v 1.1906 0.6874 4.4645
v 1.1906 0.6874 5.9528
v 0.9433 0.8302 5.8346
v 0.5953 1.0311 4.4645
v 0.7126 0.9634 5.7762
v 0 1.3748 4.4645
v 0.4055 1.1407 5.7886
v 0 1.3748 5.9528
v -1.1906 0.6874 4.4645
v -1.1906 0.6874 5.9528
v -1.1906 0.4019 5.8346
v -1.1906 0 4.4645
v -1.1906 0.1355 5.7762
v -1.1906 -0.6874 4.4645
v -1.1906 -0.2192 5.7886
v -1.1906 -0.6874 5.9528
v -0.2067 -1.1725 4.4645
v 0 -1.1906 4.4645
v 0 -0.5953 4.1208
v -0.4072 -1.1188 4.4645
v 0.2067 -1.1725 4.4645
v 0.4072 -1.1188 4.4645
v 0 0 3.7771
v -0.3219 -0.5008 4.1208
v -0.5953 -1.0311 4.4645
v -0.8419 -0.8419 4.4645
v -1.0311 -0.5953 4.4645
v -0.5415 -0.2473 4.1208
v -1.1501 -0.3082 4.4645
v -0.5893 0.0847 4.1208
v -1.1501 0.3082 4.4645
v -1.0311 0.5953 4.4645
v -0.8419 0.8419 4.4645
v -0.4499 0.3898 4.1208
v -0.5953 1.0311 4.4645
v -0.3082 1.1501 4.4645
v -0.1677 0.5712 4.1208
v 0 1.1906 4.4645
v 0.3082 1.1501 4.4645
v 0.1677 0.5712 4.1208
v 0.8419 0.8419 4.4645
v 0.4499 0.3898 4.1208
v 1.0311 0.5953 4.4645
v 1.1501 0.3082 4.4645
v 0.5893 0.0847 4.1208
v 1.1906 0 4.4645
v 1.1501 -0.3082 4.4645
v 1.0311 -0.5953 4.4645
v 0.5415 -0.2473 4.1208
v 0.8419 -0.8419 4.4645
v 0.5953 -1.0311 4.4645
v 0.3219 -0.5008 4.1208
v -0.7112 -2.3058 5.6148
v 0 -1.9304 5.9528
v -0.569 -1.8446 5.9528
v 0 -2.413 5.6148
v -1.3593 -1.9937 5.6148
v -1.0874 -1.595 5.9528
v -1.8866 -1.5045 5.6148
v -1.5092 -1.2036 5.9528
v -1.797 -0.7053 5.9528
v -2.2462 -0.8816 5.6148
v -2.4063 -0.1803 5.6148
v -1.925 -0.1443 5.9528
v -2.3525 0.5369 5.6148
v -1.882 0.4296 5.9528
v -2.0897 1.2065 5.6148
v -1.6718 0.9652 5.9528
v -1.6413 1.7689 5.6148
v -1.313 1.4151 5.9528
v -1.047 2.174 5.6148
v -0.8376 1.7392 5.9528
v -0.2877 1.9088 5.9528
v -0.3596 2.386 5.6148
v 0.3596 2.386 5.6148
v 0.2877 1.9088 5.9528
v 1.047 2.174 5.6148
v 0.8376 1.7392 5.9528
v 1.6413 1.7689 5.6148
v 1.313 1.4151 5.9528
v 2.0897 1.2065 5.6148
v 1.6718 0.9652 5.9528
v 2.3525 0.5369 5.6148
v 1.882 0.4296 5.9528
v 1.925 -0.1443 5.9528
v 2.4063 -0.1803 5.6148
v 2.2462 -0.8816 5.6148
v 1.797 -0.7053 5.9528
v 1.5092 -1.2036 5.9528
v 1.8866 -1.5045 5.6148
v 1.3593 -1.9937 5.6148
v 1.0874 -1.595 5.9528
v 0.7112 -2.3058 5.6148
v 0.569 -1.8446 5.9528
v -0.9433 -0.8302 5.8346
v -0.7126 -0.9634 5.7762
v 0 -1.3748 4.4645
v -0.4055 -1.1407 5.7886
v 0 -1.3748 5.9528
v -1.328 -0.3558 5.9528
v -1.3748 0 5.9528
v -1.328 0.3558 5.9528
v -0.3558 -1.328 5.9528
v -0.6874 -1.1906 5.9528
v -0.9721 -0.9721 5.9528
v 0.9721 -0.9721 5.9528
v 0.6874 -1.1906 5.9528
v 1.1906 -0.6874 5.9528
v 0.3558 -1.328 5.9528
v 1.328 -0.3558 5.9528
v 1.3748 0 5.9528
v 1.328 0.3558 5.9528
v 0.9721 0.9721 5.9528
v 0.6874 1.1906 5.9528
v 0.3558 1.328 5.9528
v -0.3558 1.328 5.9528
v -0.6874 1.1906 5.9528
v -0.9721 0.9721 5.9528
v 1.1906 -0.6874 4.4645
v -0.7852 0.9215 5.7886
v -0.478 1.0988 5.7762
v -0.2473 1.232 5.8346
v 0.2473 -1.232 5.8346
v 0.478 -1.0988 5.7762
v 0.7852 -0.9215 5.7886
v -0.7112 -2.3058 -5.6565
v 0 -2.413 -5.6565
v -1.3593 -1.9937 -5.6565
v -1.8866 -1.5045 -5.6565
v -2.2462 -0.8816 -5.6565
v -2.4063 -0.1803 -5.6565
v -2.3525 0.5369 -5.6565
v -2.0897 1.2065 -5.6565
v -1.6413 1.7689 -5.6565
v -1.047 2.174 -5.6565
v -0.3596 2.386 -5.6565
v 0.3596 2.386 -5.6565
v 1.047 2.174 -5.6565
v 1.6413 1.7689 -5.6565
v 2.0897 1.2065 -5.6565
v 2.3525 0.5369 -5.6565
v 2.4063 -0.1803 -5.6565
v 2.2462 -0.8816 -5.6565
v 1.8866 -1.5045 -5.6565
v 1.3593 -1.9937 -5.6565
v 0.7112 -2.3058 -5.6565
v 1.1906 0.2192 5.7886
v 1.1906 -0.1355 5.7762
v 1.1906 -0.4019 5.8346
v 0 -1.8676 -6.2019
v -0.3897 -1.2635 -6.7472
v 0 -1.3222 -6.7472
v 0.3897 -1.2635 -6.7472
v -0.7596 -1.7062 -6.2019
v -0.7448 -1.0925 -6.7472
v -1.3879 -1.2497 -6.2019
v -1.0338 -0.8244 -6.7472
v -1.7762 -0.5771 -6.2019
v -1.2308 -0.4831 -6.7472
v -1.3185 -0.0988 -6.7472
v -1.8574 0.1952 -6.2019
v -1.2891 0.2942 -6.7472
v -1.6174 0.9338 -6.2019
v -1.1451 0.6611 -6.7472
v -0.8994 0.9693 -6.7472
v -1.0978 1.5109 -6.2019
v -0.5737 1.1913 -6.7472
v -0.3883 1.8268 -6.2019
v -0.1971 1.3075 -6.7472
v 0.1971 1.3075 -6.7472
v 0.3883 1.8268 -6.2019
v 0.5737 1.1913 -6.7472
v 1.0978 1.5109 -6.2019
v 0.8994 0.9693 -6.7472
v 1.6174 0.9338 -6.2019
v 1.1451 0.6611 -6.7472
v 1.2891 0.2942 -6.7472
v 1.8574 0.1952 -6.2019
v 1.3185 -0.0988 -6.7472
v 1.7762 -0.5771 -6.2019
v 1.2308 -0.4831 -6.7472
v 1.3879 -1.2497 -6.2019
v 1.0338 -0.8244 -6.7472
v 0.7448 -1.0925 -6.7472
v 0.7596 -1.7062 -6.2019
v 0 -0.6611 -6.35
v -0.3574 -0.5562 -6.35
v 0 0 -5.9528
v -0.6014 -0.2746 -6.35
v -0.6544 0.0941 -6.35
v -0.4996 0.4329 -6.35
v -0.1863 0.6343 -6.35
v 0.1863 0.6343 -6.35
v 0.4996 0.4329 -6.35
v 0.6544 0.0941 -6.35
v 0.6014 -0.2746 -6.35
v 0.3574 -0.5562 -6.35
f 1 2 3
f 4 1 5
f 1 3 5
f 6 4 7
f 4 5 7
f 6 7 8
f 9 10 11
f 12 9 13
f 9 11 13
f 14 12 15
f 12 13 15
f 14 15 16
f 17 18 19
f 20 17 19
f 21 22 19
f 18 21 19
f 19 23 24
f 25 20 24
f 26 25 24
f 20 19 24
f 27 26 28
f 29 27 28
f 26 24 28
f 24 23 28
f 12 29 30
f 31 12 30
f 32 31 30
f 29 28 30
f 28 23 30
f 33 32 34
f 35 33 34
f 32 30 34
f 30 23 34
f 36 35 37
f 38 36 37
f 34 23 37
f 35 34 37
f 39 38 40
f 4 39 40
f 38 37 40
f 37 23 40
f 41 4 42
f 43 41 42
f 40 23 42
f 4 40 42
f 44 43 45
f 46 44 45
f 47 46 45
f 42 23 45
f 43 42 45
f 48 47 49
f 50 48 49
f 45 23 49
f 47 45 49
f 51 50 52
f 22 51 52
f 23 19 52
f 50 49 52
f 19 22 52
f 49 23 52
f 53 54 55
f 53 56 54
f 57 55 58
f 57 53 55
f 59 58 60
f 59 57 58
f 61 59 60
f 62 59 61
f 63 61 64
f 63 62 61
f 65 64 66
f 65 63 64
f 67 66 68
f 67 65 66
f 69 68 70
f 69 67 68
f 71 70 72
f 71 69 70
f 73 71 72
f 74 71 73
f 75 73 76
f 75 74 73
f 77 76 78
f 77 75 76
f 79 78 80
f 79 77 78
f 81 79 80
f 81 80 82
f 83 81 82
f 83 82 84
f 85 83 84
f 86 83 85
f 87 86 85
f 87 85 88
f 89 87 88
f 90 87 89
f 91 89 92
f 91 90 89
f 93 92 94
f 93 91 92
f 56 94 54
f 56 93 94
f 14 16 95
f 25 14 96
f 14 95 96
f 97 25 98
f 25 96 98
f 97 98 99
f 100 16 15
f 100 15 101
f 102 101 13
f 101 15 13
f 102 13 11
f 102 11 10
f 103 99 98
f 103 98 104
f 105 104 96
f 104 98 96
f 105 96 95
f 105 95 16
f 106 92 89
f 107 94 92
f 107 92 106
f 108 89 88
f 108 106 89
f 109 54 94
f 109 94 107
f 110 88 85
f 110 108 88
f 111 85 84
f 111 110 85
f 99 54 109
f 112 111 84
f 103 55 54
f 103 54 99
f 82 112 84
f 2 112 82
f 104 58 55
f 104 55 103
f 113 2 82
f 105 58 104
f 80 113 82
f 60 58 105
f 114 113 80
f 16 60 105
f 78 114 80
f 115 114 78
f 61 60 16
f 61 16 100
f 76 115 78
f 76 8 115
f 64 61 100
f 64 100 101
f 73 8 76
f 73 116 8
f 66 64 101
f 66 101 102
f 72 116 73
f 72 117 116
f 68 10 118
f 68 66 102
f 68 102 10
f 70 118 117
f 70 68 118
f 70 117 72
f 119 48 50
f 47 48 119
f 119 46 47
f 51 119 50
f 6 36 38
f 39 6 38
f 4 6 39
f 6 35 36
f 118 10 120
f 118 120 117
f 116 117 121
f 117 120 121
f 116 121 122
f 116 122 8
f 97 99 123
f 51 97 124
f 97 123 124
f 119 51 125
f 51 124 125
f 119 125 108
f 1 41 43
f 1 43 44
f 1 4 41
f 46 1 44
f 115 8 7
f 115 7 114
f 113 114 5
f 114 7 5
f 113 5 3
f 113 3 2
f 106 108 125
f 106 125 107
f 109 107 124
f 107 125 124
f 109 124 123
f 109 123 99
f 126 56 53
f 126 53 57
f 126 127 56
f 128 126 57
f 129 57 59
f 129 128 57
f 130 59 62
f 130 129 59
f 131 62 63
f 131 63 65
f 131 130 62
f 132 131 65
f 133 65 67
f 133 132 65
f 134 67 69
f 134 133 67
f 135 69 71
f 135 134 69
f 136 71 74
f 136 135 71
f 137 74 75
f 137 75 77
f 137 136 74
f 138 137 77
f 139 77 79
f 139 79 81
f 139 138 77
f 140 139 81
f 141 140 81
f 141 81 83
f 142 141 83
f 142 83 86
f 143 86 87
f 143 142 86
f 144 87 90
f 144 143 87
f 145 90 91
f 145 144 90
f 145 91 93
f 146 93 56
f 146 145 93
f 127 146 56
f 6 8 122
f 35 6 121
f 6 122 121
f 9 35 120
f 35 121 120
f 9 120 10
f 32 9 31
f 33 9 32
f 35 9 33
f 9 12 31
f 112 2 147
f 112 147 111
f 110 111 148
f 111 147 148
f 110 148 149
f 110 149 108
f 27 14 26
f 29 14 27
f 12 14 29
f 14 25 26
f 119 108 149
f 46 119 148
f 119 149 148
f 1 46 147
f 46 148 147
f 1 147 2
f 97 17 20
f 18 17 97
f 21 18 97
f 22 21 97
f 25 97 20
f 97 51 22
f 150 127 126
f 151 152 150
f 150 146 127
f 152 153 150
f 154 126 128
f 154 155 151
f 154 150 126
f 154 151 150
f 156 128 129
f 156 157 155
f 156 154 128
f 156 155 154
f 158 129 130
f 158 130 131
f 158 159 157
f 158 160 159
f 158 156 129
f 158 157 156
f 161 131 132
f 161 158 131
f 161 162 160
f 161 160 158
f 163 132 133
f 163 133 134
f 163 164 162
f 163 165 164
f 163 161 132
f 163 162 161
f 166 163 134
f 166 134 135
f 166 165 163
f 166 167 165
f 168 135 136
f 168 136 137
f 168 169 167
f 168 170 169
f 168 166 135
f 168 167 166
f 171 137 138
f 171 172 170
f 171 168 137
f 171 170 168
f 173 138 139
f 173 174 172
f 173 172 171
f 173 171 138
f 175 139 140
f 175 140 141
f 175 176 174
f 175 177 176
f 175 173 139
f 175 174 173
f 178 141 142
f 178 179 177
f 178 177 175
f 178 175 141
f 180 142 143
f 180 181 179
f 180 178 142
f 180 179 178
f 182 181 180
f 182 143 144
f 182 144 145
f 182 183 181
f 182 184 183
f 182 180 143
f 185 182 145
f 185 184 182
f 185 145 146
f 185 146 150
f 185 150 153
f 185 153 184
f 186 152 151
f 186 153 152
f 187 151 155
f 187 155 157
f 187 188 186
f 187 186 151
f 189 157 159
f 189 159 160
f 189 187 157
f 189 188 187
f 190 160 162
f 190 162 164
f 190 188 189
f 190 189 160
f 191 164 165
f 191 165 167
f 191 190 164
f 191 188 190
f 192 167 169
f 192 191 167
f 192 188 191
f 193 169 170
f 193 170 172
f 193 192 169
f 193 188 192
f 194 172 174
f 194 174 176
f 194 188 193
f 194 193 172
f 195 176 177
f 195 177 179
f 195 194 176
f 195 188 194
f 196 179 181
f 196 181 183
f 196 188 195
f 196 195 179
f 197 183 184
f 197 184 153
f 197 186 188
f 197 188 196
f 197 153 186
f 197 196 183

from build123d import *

# Parameters (mm, degrees)
CUT_EXTRUDE10_DEPTH = 1.48828125


with BuildPart() as part:
    # Sketch22 → Revolve1 (revolve)
    with BuildSketch(Plane(origin=(0, 0, 0), x_dir=(0, 0, -1), z_dir=(1, 0, 0))):
        Polygon((-5.952759232, 0), (-5.952759232, 1.9304), (-5.614839074, 2.413), (5.656480087, 2.413), (6.747240768, 1.322239319), (5.952759232, 0), align=None)
    revolve(axis=Axis((0, 0, -5.952759232), (0, 0, -1)))

    # Sketch23 → Cut-Extrude10 (cut)
    with BuildSketch(Plane.XY.offset(5.952759232)):
        Polygon((0, 1.374815329), (-1.190625, 0.687407664), (-1.190625, -0.687407664), (0, -1.374815329), (1.190625, -0.687407664), (1.190625, 0.687407664), align=None)
    extrude(amount=-CUT_EXTRUDE10_DEPTH, mode=Mode.SUBTRACT)

    # Cut-Extrude11 cone 1 section (through the dimple's axis) → Cut-Extrude11 (revolve, cut)
    with BuildSketch(Plane(origin=(0, 0, 5.952759232), x_dir=(0, -1, 0), z_dir=(1, 0, 0))):
        Polygon((0, 0), (1.374815329, 0), (0, 1.374815329), align=None)
    revolve(axis=Axis((0, 0, 5.952759232), (0, 0, -1)), mode=Mode.SUBTRACT)

    # Cut-Extrude12 cone 1 section (through the dimple's axis) → Cut-Extrude12 (revolve, cut)
    with BuildSketch(Plane(origin=(0, 0, 4.464477982), x_dir=(0, -1, 0), z_dir=(1, 0, 0))):
        Polygon((0, 0), (1.190625, 0), (0, 0.687407664), align=None)
    revolve(axis=Axis((0, 0, 4.464477982), (0, 0, -1)), mode=Mode.SUBTRACT)


solid = part.part
